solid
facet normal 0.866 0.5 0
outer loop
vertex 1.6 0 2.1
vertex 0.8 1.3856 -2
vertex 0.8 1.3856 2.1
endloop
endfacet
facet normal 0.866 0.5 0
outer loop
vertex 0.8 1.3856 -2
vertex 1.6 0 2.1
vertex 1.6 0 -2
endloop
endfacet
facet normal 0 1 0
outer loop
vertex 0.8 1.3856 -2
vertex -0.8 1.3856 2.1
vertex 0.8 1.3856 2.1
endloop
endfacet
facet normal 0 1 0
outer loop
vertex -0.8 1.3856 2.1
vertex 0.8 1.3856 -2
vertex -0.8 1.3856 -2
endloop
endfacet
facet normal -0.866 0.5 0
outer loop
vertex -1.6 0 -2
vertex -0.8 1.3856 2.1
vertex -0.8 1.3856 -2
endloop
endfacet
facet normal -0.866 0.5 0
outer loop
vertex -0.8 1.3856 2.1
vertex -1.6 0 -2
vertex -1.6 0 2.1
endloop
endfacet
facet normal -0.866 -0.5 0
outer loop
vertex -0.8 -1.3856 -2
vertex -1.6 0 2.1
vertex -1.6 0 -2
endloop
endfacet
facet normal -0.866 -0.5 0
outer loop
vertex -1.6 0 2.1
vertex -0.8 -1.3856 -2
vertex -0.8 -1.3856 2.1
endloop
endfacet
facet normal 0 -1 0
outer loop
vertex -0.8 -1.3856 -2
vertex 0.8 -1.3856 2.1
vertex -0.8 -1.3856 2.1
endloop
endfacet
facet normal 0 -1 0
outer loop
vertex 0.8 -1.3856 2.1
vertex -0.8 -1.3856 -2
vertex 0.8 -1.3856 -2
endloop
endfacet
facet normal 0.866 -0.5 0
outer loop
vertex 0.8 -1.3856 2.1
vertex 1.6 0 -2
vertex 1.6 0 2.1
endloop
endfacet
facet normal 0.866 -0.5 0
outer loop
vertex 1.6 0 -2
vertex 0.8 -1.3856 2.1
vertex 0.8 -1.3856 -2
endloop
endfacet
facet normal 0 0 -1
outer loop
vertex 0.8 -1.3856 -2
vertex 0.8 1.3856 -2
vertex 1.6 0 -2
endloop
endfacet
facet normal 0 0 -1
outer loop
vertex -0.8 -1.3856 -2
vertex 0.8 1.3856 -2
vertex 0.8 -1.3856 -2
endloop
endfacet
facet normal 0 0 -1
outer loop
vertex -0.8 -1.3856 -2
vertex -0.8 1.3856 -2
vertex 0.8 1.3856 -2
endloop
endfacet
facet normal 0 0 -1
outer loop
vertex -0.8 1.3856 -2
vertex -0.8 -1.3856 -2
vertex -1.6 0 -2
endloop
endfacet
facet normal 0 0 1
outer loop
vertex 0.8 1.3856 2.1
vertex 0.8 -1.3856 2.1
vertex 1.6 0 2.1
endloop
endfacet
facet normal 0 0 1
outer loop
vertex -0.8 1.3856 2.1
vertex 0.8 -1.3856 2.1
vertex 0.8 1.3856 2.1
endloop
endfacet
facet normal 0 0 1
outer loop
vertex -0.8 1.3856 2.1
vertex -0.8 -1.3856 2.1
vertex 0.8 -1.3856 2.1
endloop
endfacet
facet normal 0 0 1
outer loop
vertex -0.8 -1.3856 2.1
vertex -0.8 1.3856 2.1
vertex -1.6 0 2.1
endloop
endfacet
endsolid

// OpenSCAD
//
//  File:        heatsetinsert.scad
//
//  License:     Creative Commons Attribution 4.0 International (CC BY 4.0)
//               https://creativecommons.org/licenses/by/4.0/
//
//  You are free to:
//    - Share: copy and redistribute the material in any medium or format
//    - Adapt: remix, transform, and build upon the material for any purpose
//
//  Under the following terms:
//    - Attribution: You must give appropriate credit, provide a link to the license,
//      and indicate if changes were made. You may do so in any reasonable manner,
//      but not in any way that suggests the licensor endorses you or your use.
//
//  (c) 2025 Sebastian Toepfer – https://github.com/sebastian-toepfer/3d-models
//
//  SPDX-License-Identifier: CC-BY-4.0
heatsetinsert();

// M2x3.0 -> change to a lookup later!
module heatsetinsert(height = 4) {
    translate([0, 0, 0.1 / 2]) {
        cylinder(h = height + 0.1, d = 3.2, center = true);
    }
}
